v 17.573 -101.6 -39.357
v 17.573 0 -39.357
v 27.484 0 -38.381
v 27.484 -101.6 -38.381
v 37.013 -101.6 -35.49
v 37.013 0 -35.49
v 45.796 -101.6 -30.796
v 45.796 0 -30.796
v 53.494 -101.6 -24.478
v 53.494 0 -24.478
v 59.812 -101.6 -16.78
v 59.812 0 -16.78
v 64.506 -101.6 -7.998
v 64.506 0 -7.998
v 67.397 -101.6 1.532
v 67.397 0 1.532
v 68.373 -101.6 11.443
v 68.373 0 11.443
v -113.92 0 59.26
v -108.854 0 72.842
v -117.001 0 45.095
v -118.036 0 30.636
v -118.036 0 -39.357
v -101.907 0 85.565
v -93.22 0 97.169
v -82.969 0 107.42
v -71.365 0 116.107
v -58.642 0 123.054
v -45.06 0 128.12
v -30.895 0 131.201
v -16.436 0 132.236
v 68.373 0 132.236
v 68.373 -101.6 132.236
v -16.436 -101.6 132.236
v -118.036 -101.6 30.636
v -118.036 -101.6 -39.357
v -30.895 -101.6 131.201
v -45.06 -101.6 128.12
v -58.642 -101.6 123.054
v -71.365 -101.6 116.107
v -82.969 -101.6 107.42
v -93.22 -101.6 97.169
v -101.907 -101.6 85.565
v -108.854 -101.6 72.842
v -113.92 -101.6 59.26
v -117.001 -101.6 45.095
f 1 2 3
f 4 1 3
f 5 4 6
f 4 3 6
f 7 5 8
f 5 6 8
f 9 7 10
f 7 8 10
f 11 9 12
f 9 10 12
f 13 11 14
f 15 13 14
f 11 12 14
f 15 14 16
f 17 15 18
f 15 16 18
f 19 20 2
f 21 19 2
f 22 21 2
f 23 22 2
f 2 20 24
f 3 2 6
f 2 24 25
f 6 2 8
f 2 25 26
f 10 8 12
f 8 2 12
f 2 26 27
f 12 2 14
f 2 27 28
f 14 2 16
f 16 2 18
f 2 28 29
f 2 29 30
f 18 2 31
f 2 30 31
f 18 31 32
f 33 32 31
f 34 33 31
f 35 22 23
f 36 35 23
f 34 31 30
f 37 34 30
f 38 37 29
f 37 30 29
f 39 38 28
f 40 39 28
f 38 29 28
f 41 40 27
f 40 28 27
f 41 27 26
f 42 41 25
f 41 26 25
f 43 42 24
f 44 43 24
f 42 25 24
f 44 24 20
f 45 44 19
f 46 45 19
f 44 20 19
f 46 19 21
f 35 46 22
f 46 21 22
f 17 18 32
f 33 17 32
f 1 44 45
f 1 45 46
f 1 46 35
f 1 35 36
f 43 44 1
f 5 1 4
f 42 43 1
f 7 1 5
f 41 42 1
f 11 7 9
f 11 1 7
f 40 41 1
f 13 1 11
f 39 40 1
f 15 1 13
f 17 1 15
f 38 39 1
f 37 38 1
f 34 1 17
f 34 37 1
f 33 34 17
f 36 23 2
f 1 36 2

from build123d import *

# Parameters (mm, degrees)
F1_DEPTH = 101.6


with BuildPart() as f1:
    # F0 (on Front) → F1 (new body)
    with BuildSketch(Plane.XZ):
        with BuildLine():
            Line((68.37305, 132.235599), (-16.435547, 132.235599))
            ThreePointArc((-16.435547, 132.235599), (-88.277596, 102.477647), (-118.035547, 30.635599))
            Line((-118.035547, 30.635599), (-118.035547, -39.357398))
            Line((-118.035547, -39.357398), (17.57305, -39.357398))
            ThreePointArc((17.57305, -39.357398), (53.494074, -24.478422), (68.37305, 11.442602))
            Line((68.37305, 11.442602), (68.37305, 132.235599))
        make_face()
    extrude(amount=F1_DEPTH)


solid = f1.part
